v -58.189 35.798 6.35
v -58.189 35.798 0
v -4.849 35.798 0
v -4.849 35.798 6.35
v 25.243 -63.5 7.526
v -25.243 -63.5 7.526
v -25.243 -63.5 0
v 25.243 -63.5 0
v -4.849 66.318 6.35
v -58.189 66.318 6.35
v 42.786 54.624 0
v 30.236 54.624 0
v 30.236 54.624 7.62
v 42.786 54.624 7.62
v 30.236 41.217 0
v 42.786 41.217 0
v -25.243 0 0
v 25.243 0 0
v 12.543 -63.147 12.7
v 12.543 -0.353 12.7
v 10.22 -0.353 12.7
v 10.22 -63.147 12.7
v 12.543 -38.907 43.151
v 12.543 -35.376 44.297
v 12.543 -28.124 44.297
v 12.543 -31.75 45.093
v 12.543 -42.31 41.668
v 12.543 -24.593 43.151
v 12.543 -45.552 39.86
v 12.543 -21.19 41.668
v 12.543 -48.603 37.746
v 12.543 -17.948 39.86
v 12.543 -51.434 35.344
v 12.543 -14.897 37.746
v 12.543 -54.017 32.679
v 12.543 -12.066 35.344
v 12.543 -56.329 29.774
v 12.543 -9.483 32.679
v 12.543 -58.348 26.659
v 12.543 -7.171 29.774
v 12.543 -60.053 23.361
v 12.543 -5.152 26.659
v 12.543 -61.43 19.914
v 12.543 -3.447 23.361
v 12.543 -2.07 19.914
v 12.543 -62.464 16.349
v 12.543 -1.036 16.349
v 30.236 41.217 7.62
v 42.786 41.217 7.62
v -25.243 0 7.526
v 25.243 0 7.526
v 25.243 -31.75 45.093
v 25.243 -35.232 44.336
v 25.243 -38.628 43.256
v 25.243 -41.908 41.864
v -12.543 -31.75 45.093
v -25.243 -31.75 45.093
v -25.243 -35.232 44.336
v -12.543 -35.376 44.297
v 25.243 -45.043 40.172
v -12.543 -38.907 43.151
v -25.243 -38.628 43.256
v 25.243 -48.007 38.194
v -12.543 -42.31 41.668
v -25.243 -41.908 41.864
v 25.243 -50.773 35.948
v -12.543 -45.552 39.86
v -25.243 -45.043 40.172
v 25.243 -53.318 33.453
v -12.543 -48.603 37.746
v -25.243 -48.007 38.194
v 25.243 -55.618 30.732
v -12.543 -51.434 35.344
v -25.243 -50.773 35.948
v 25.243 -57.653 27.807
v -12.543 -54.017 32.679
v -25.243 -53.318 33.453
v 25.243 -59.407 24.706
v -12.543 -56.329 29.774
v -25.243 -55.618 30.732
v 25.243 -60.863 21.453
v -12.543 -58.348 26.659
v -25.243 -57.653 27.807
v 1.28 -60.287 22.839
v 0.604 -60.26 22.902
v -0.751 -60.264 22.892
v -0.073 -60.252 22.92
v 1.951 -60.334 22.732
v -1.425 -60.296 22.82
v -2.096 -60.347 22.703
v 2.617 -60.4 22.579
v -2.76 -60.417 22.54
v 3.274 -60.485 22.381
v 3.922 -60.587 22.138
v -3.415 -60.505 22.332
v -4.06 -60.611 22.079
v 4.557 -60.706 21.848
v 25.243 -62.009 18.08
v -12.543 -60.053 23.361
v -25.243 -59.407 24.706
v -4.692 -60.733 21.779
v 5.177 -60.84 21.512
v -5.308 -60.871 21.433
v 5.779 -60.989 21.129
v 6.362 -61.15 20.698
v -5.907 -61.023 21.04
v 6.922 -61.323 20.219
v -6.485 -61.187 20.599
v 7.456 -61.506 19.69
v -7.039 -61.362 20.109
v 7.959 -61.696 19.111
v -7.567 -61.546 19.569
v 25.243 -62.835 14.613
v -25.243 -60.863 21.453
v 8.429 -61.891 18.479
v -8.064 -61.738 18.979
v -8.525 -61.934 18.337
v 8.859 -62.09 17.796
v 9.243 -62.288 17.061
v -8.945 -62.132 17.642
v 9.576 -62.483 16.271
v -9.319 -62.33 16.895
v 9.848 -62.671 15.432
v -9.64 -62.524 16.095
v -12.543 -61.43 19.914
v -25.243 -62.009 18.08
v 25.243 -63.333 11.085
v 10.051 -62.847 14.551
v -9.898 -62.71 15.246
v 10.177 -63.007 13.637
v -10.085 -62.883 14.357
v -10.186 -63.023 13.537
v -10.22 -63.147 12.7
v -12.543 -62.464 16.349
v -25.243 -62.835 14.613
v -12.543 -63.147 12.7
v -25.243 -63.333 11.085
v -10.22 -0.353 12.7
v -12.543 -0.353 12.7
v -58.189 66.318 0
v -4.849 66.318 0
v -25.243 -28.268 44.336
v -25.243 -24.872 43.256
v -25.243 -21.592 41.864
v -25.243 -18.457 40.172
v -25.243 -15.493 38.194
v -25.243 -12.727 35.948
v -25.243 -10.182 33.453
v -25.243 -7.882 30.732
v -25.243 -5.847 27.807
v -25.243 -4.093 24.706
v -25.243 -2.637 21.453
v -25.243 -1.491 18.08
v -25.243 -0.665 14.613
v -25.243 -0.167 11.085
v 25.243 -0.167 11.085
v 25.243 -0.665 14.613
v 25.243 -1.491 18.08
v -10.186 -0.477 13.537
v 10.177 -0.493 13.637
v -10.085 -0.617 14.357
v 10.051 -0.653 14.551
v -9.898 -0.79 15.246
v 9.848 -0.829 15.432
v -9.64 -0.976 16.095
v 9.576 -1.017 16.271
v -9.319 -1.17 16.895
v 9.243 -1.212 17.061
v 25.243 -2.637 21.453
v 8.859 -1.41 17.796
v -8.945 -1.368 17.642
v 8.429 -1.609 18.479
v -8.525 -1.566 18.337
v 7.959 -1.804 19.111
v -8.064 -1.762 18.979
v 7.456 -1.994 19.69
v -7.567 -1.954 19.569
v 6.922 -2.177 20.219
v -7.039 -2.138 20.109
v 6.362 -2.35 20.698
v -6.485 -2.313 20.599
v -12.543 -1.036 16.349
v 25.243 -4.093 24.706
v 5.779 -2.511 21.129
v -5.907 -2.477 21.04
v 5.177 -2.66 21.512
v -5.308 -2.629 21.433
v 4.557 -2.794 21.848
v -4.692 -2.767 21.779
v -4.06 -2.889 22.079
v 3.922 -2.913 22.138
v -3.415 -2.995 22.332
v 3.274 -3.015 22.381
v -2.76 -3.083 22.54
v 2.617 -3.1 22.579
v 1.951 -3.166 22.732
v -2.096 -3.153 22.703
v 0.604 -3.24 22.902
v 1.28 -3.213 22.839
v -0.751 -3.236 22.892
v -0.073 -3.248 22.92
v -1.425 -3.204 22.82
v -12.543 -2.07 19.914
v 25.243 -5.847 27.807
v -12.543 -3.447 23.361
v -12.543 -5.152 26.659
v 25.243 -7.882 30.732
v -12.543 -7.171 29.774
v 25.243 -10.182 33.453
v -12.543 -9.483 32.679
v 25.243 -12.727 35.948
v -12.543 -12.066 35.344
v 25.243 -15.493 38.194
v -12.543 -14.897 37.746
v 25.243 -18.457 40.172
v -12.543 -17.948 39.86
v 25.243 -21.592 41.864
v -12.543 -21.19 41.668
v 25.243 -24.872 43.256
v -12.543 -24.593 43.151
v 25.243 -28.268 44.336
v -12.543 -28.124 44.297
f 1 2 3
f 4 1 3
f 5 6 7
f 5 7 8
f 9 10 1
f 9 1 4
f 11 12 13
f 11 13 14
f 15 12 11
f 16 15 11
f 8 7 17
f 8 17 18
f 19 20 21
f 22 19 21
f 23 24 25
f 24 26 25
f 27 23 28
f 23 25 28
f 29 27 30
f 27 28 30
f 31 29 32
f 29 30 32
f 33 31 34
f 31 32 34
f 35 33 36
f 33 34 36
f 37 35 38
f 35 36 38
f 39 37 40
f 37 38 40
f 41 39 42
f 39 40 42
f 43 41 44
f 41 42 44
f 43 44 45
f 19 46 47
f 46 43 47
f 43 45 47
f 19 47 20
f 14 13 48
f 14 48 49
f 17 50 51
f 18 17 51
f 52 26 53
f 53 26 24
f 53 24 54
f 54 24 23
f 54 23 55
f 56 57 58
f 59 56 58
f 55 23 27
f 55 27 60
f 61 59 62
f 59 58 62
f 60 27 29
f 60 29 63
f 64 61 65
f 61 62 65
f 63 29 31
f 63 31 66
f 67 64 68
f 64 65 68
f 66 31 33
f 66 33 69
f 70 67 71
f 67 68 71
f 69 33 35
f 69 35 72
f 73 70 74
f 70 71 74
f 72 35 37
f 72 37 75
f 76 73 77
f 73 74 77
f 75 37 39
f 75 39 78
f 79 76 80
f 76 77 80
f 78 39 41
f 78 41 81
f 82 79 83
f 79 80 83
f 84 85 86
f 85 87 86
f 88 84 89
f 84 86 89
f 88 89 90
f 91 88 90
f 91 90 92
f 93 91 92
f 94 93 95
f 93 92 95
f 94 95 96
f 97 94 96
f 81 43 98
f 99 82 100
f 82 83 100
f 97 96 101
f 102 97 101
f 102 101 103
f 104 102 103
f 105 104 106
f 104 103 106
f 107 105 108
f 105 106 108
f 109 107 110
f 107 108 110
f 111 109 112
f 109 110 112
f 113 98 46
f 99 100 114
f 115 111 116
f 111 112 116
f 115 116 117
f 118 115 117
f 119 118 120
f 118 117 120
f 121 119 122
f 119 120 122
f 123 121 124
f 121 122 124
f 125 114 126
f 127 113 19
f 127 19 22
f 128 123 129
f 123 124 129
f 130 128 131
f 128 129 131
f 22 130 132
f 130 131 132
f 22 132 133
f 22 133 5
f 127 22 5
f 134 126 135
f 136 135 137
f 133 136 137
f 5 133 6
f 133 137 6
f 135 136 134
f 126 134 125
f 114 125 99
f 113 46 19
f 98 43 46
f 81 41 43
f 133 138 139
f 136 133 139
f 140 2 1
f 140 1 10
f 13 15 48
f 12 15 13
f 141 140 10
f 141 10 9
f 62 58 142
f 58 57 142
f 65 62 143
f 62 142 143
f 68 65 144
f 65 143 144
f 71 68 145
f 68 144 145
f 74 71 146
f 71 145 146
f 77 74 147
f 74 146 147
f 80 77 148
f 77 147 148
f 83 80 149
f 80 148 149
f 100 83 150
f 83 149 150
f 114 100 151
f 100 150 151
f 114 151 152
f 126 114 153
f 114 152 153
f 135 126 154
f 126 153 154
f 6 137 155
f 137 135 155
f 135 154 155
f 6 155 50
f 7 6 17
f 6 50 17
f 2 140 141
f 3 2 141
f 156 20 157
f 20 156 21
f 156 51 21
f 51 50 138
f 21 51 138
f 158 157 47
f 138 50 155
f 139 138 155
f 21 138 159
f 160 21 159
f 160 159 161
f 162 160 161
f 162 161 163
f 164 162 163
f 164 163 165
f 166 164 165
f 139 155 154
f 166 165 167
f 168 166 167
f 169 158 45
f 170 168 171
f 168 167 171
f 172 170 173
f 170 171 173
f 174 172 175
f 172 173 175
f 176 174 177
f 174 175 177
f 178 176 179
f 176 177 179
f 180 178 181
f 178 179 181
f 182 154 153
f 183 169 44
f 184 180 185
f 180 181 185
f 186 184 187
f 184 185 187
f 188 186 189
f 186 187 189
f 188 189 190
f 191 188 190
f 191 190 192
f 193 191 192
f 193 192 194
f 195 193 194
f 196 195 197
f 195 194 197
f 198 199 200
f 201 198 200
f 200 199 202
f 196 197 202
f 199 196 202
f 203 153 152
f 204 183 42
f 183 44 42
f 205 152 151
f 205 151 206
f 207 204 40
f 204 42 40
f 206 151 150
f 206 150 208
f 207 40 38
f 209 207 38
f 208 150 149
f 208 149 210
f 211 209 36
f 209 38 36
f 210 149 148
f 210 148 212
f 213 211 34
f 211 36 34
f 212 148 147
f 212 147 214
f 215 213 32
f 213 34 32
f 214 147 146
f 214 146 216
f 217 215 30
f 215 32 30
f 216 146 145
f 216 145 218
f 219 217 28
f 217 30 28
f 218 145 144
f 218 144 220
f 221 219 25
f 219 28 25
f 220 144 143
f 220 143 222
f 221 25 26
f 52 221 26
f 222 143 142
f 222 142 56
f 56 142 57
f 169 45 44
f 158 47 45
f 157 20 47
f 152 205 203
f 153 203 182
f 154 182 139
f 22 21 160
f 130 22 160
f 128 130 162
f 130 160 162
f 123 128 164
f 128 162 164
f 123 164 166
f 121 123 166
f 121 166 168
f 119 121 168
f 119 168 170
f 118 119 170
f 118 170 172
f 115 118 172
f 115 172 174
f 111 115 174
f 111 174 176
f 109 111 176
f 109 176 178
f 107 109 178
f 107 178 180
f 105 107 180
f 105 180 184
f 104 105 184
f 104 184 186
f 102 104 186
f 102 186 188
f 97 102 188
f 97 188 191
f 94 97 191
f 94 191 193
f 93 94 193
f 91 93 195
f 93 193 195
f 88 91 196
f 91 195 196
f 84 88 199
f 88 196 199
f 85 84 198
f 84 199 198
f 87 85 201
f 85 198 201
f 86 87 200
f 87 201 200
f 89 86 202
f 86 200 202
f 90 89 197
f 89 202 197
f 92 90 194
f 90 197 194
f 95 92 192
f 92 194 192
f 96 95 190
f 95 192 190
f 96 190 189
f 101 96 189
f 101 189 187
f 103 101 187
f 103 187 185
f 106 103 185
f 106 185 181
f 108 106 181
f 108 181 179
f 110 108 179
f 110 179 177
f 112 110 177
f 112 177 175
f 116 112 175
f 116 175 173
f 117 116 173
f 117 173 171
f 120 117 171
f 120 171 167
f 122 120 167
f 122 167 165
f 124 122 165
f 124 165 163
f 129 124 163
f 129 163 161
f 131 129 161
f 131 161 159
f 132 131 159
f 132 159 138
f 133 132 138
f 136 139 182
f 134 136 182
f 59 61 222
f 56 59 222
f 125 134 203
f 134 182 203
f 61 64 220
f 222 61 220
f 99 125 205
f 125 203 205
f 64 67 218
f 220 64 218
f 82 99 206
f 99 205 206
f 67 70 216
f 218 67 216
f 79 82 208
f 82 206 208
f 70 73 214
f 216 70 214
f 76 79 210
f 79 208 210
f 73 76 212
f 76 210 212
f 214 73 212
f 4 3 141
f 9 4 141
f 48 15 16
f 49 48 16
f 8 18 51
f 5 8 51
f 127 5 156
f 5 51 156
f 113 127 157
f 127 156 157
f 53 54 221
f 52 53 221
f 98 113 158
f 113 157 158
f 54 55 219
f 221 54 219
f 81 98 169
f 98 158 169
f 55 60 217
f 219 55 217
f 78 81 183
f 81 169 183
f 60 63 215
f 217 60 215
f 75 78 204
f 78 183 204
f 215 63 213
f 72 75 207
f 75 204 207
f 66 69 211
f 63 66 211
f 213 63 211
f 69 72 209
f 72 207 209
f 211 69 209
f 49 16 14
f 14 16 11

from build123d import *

# Parameters (mm, degrees)
F1_DEPTH    = 63.5
F2_T1_DEPTH = 203.2
F2_T3_DEPTH = 203.2
F5_W        = 53.3400033601
F5_H        = 30.5207520723
F6_DEPTH    = 6.35
F7_W        = 12.5505924225
F7_H        = 13.4063139558
F8_DEPTH    = 7.62


# Not quite as in the source:
# - a fillet or chamfer that OpenCascade refuses, or shapes differently, is made with other operations: its cross-section is extruded or revolved along the edge and cut away or added
# - the program builds the solid bodies; features that only make, move or delete a surface that nothing else refers to are left out


with BuildPart() as f1:
    # F0 (on Front) → F1 (new body)
    with BuildSketch(Plane.XZ):
        with BuildLine():
            Line((-25.2432132988, 0), (0, 0))
            Line((0, 0), (25.2432132988, 0))
            Line((25.2432132988, 0), (25.2432132988, 45.6259317593))
            Line((25.2432132988, 45.6259317593), (12.5432132988, 45.6259317593))
            Line((12.5432132988, 45.6259317593), (12.5432132988, 12.7))
            Line((12.5432132988, 12.7), (10.2199126405, 12.7))
            ThreePointArc((10.2199126405, 12.7), (0, 22.9199126405), (-10.2199126405, 12.7))
            Line((-10.2199126405, 12.7), (-12.5432132988, 12.7))
            Line((-12.5432132988, 12.7), (-12.5432132988, 45.6259317593))
            Line((-12.5432132988, 45.6259317593), (-25.2432132988, 45.6259317593))
            Line((-25.2432132988, 45.6259317593), (-25.2432132988, 0))
        make_face()
    extrude(amount=F1_DEPTH)

    # F2: fillet of radius 38.1 on 4 edges, made by hand

    # F2_s2 → F2_t1 (cut)
    with BuildSketch(Plane.YZ.offset(-120.4932132988)):
        with BuildLine():
            ThreePointArc((-25.4, 45.6259317593), (-52.3407683632, 34.4667001225), (-63.5, 7.5259317593))
            Line((-63.5, 7.5259317593), (-63.5, 45.6259317593))
            Line((-63.5, 45.6259317593), (-25.4, 45.6259317593))
        make_face()
        with BuildLine():
            ThreePointArc((0, 7.5259317593), (-11.1592316368, 34.4667001225), (-38.1, 45.6259317593))
            Line((-38.1, 45.6259317593), (0, 45.6259317593))
            Line((0, 45.6259317593), (0, 7.5259317593))
        make_face()
    extrude(amount=F2_T1_DEPTH, mode=Mode.SUBTRACT)

    # F2_s4 → F2_t3 (cut)
    with BuildSketch(Plane.YZ.offset(-82.7067867012)):
        with BuildLine():
            ThreePointArc((-25.4, 45.6259317593), (-52.3407683632, 34.4667001225), (-63.5, 7.5259317593))
            Line((-63.5, 7.5259317593), (-63.5, 45.6259317593))
            Line((-63.5, 45.6259317593), (-25.4, 45.6259317593))
        make_face()
        with BuildLine():
            ThreePointArc((0, 7.5259317593), (-11.1592316368, 34.4667001225), (-38.1, 45.6259317593))
            Line((-38.1, 45.6259317593), (0, 45.6259317593))
            Line((0, 45.6259317593), (0, 7.5259317593))
        make_face()
    extrude(amount=F2_T3_DEPTH, mode=Mode.SUBTRACT)


with BuildPart() as f6:
    # F5 (on Top) → F6 (new body)
    with BuildSketch(Plane.XY):
        with Locations((-31.5190923866, 51.0580763221)):
            Rectangle(F5_W, F5_H)
    extrude(amount=F6_DEPTH)


with BuildPart() as f8:
    # F7 (on Top) → F8 (new body)
    with BuildSketch(Plane.XY):
        with Locations((36.5108028054, 47.9204282165)):
            Rectangle(F7_W, F7_H)
    extrude(amount=F8_DEPTH)


solid = Compound([f1.part, f6.part, f8.part])
